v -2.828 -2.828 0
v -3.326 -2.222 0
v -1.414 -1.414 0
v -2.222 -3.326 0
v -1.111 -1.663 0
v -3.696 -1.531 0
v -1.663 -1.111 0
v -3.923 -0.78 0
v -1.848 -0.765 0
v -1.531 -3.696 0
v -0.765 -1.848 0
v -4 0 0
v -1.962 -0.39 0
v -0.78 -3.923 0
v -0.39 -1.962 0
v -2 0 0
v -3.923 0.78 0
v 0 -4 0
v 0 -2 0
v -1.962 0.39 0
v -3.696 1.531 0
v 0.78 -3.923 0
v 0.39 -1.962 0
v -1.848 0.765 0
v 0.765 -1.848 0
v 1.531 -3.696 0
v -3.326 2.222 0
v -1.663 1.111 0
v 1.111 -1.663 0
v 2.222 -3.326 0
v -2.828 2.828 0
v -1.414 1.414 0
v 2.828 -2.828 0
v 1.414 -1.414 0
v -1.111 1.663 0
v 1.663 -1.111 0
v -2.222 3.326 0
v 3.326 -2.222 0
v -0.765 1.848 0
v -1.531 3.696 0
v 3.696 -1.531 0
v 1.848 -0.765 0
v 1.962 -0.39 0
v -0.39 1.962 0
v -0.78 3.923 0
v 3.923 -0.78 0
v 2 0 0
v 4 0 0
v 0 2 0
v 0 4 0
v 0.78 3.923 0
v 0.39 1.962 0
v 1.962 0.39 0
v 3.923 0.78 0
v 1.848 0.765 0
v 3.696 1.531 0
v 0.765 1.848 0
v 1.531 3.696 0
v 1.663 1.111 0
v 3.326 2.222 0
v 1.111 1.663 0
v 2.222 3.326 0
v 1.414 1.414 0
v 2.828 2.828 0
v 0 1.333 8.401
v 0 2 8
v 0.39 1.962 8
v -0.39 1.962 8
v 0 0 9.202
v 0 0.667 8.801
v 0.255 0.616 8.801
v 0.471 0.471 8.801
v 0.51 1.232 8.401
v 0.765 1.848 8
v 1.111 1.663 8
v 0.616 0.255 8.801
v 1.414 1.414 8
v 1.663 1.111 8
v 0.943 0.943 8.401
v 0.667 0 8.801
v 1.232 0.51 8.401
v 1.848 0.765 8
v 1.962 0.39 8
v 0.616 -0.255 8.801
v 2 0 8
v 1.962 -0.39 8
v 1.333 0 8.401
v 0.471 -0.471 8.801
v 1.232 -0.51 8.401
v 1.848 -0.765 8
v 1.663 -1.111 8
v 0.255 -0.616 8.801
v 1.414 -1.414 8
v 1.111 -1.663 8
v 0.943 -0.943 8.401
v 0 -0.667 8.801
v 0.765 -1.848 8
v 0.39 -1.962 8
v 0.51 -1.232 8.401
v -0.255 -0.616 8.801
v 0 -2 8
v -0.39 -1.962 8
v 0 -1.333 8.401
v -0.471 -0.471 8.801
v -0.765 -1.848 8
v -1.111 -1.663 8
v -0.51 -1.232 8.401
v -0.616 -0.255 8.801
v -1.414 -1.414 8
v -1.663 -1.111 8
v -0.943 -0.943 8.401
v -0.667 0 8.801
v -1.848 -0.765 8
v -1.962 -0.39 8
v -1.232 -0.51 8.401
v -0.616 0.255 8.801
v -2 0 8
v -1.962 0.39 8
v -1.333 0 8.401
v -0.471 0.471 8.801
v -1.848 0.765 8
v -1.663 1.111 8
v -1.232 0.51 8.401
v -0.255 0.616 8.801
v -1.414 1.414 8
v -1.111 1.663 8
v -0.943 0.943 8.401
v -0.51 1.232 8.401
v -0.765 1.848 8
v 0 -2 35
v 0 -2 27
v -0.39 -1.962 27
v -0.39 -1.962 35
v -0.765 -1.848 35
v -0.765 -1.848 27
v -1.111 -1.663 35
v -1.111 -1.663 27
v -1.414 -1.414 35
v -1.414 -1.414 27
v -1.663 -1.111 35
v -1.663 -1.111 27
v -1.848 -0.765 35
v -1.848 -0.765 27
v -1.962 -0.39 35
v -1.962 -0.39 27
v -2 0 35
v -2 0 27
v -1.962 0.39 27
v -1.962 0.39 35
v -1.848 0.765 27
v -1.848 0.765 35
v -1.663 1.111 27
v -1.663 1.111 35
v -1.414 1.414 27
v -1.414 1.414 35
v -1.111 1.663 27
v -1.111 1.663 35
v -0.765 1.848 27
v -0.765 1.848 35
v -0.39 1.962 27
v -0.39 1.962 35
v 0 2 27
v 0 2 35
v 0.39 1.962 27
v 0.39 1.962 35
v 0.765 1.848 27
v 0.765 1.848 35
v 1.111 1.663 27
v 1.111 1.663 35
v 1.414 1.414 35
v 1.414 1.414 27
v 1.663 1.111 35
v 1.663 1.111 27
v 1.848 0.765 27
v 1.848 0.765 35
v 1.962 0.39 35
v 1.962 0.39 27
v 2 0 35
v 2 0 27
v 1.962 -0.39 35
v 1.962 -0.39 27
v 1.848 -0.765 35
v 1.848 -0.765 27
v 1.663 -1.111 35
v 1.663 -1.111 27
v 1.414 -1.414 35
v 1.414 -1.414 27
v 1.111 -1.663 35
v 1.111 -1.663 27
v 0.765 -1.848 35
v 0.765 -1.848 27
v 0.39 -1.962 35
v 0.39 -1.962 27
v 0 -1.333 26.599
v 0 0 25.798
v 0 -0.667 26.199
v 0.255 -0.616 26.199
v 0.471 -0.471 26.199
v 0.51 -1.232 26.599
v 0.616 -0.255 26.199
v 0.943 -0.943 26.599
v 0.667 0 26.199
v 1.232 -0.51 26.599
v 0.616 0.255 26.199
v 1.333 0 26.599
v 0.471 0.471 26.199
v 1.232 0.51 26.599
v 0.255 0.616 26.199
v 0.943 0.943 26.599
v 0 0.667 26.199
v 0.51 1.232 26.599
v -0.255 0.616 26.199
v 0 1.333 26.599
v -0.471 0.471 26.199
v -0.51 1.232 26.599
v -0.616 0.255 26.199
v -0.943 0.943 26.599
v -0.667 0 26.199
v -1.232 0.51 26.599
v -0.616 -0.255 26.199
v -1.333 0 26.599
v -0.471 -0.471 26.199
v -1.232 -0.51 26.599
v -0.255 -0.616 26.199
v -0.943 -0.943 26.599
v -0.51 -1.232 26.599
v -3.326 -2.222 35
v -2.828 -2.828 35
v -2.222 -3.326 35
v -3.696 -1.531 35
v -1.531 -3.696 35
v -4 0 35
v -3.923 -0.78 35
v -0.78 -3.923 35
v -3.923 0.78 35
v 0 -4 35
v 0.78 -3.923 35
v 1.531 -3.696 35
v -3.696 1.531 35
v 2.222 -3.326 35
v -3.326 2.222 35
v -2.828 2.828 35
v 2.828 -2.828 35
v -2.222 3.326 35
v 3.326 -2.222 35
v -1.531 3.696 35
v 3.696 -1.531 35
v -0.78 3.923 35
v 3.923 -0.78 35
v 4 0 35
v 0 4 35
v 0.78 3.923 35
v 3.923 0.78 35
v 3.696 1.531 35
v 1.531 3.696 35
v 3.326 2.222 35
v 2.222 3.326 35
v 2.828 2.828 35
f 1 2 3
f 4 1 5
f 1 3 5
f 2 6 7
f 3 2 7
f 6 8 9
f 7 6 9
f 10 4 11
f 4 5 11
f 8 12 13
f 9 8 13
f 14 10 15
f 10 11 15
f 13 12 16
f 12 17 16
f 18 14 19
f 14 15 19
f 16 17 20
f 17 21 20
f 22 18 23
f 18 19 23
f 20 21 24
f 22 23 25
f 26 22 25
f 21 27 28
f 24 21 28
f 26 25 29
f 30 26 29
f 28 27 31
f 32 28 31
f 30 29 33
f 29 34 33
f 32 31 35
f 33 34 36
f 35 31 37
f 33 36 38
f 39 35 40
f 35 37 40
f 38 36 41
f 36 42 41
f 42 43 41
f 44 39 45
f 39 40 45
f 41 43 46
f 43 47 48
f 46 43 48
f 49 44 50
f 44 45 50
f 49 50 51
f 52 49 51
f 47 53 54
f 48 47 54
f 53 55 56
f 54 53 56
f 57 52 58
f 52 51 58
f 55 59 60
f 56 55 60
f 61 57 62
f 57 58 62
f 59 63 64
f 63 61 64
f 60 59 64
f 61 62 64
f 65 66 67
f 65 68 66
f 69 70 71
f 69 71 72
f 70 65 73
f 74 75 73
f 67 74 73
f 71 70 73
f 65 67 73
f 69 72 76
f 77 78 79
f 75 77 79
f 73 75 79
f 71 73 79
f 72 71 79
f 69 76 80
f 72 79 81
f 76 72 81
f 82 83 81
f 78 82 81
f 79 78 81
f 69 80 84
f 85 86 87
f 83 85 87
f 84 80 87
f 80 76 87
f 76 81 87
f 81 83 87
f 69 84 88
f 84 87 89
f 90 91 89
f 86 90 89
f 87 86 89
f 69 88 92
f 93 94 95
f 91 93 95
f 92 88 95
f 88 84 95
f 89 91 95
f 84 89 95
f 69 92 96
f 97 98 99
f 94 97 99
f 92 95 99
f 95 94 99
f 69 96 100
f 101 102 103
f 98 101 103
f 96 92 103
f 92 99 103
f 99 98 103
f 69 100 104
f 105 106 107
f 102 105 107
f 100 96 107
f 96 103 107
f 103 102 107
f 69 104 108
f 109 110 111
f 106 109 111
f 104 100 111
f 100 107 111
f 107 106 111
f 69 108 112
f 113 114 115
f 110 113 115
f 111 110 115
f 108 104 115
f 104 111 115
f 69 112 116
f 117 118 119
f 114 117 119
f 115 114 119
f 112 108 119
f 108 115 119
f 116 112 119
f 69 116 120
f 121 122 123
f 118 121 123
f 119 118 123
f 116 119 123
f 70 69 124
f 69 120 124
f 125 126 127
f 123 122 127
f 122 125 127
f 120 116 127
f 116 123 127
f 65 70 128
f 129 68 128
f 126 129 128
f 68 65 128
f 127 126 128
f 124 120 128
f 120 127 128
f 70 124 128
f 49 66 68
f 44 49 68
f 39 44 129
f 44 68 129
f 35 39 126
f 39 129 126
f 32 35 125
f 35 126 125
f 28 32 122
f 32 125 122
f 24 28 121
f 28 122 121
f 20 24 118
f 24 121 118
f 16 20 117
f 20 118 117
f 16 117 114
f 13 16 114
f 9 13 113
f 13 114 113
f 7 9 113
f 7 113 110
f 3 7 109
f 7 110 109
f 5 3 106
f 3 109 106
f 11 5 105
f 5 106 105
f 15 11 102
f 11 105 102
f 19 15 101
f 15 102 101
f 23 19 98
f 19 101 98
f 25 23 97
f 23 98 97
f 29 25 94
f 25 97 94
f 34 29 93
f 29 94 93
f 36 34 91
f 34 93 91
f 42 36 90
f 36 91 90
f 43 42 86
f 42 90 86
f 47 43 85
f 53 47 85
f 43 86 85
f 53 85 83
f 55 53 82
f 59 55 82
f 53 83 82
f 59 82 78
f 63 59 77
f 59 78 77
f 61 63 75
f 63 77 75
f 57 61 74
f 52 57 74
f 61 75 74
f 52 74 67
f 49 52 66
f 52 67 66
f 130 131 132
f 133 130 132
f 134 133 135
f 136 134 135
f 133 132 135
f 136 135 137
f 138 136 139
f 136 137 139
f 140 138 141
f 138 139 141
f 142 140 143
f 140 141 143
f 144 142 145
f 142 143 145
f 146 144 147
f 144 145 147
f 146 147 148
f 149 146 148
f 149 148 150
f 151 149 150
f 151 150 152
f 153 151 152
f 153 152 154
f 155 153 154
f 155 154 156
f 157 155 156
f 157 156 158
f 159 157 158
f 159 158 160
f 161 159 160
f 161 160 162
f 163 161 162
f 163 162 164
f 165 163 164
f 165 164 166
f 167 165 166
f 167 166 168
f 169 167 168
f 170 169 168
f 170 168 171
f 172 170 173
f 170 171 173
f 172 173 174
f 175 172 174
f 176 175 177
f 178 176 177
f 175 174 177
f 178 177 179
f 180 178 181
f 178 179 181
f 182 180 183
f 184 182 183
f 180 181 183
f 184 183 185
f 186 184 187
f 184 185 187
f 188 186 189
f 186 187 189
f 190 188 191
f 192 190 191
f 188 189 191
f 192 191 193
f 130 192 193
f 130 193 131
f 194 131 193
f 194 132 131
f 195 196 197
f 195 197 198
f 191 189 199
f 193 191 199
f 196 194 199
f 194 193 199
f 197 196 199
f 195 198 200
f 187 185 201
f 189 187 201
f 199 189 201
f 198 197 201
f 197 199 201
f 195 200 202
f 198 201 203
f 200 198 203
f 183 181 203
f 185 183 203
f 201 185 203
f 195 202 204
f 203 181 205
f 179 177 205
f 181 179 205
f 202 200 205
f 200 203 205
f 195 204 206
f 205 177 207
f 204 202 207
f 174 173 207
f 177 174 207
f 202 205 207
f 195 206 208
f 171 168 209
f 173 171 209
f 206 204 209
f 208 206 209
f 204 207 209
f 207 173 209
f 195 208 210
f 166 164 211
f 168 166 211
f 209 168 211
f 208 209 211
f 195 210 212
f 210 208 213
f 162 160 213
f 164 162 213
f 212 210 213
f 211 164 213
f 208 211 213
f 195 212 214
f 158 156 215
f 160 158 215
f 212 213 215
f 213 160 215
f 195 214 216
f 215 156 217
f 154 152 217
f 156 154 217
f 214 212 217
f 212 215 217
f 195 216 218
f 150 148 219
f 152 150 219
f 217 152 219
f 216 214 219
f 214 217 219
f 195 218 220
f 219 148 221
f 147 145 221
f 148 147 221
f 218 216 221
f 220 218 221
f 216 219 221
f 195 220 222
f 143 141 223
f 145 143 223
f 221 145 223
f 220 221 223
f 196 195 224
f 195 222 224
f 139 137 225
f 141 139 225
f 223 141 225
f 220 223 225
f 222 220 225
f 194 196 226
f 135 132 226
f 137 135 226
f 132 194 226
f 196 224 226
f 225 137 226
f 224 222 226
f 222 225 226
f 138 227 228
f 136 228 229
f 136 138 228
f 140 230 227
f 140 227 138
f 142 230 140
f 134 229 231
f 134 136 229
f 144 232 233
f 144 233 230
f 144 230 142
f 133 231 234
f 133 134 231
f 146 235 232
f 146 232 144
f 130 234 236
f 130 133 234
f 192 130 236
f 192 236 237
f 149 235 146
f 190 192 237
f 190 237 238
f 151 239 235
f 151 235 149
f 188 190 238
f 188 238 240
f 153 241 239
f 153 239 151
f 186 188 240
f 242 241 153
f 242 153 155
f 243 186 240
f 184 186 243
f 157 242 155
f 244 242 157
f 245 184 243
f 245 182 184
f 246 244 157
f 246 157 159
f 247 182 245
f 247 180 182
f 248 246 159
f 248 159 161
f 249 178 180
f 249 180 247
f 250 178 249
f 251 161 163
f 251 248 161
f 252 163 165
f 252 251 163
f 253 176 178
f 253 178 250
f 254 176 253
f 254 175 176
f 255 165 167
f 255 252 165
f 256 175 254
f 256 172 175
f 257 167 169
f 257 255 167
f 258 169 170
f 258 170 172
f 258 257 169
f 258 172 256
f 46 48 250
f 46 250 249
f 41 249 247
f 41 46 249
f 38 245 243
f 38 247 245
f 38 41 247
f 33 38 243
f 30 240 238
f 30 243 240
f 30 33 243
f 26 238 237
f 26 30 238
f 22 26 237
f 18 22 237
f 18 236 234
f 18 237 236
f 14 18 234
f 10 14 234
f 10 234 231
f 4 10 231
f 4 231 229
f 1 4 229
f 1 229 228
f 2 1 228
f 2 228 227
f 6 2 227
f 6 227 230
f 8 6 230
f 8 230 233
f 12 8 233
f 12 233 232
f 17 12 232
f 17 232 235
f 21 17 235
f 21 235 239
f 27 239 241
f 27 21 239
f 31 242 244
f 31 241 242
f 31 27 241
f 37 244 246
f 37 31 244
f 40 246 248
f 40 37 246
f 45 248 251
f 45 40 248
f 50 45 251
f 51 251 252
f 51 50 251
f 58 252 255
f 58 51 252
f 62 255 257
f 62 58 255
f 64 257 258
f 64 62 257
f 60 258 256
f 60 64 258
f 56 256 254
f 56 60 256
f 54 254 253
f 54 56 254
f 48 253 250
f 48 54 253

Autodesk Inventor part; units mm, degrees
ref_plane "YZ Plane" through (0, 0, 0) normal (1, 0, 0) x (0, 1, 0)
ref_plane "XZ Plane" through (0, 0, 0) normal (0, 1, 0) x (-1, 0, 0)
ref_plane "XY Plane" through (0, 0, 0) normal (0, 0, 1) x (1, 0, 0)
sketch "スケッチ1" plane through (0, 0, 0) normal (0, 0, 1) x (1, 0, 0)
  circle A0 centre (0, 0) radius 4
  dimension "d0" = 8
extrude "押し出し1" add sketch "スケッチ1" along normal blind 35
hole "穴1" at (0, 0, 0) direction (0, 0, 1) diameter 4 depth 8 tip angle 118
sketch "スケッチ2" plane through (0, 0, 35) normal (0, 0, 1) x (1, 0, 0)
  point P0 (0, 0)
  point P1 (0, 0)
hole "穴2" at (0, 0, 35) direction (0, 0, -1) diameter 4 depth 8 tip angle 118
properties part number "スペーサ　m4-l35" material "アルミニウム 2014-T4"
